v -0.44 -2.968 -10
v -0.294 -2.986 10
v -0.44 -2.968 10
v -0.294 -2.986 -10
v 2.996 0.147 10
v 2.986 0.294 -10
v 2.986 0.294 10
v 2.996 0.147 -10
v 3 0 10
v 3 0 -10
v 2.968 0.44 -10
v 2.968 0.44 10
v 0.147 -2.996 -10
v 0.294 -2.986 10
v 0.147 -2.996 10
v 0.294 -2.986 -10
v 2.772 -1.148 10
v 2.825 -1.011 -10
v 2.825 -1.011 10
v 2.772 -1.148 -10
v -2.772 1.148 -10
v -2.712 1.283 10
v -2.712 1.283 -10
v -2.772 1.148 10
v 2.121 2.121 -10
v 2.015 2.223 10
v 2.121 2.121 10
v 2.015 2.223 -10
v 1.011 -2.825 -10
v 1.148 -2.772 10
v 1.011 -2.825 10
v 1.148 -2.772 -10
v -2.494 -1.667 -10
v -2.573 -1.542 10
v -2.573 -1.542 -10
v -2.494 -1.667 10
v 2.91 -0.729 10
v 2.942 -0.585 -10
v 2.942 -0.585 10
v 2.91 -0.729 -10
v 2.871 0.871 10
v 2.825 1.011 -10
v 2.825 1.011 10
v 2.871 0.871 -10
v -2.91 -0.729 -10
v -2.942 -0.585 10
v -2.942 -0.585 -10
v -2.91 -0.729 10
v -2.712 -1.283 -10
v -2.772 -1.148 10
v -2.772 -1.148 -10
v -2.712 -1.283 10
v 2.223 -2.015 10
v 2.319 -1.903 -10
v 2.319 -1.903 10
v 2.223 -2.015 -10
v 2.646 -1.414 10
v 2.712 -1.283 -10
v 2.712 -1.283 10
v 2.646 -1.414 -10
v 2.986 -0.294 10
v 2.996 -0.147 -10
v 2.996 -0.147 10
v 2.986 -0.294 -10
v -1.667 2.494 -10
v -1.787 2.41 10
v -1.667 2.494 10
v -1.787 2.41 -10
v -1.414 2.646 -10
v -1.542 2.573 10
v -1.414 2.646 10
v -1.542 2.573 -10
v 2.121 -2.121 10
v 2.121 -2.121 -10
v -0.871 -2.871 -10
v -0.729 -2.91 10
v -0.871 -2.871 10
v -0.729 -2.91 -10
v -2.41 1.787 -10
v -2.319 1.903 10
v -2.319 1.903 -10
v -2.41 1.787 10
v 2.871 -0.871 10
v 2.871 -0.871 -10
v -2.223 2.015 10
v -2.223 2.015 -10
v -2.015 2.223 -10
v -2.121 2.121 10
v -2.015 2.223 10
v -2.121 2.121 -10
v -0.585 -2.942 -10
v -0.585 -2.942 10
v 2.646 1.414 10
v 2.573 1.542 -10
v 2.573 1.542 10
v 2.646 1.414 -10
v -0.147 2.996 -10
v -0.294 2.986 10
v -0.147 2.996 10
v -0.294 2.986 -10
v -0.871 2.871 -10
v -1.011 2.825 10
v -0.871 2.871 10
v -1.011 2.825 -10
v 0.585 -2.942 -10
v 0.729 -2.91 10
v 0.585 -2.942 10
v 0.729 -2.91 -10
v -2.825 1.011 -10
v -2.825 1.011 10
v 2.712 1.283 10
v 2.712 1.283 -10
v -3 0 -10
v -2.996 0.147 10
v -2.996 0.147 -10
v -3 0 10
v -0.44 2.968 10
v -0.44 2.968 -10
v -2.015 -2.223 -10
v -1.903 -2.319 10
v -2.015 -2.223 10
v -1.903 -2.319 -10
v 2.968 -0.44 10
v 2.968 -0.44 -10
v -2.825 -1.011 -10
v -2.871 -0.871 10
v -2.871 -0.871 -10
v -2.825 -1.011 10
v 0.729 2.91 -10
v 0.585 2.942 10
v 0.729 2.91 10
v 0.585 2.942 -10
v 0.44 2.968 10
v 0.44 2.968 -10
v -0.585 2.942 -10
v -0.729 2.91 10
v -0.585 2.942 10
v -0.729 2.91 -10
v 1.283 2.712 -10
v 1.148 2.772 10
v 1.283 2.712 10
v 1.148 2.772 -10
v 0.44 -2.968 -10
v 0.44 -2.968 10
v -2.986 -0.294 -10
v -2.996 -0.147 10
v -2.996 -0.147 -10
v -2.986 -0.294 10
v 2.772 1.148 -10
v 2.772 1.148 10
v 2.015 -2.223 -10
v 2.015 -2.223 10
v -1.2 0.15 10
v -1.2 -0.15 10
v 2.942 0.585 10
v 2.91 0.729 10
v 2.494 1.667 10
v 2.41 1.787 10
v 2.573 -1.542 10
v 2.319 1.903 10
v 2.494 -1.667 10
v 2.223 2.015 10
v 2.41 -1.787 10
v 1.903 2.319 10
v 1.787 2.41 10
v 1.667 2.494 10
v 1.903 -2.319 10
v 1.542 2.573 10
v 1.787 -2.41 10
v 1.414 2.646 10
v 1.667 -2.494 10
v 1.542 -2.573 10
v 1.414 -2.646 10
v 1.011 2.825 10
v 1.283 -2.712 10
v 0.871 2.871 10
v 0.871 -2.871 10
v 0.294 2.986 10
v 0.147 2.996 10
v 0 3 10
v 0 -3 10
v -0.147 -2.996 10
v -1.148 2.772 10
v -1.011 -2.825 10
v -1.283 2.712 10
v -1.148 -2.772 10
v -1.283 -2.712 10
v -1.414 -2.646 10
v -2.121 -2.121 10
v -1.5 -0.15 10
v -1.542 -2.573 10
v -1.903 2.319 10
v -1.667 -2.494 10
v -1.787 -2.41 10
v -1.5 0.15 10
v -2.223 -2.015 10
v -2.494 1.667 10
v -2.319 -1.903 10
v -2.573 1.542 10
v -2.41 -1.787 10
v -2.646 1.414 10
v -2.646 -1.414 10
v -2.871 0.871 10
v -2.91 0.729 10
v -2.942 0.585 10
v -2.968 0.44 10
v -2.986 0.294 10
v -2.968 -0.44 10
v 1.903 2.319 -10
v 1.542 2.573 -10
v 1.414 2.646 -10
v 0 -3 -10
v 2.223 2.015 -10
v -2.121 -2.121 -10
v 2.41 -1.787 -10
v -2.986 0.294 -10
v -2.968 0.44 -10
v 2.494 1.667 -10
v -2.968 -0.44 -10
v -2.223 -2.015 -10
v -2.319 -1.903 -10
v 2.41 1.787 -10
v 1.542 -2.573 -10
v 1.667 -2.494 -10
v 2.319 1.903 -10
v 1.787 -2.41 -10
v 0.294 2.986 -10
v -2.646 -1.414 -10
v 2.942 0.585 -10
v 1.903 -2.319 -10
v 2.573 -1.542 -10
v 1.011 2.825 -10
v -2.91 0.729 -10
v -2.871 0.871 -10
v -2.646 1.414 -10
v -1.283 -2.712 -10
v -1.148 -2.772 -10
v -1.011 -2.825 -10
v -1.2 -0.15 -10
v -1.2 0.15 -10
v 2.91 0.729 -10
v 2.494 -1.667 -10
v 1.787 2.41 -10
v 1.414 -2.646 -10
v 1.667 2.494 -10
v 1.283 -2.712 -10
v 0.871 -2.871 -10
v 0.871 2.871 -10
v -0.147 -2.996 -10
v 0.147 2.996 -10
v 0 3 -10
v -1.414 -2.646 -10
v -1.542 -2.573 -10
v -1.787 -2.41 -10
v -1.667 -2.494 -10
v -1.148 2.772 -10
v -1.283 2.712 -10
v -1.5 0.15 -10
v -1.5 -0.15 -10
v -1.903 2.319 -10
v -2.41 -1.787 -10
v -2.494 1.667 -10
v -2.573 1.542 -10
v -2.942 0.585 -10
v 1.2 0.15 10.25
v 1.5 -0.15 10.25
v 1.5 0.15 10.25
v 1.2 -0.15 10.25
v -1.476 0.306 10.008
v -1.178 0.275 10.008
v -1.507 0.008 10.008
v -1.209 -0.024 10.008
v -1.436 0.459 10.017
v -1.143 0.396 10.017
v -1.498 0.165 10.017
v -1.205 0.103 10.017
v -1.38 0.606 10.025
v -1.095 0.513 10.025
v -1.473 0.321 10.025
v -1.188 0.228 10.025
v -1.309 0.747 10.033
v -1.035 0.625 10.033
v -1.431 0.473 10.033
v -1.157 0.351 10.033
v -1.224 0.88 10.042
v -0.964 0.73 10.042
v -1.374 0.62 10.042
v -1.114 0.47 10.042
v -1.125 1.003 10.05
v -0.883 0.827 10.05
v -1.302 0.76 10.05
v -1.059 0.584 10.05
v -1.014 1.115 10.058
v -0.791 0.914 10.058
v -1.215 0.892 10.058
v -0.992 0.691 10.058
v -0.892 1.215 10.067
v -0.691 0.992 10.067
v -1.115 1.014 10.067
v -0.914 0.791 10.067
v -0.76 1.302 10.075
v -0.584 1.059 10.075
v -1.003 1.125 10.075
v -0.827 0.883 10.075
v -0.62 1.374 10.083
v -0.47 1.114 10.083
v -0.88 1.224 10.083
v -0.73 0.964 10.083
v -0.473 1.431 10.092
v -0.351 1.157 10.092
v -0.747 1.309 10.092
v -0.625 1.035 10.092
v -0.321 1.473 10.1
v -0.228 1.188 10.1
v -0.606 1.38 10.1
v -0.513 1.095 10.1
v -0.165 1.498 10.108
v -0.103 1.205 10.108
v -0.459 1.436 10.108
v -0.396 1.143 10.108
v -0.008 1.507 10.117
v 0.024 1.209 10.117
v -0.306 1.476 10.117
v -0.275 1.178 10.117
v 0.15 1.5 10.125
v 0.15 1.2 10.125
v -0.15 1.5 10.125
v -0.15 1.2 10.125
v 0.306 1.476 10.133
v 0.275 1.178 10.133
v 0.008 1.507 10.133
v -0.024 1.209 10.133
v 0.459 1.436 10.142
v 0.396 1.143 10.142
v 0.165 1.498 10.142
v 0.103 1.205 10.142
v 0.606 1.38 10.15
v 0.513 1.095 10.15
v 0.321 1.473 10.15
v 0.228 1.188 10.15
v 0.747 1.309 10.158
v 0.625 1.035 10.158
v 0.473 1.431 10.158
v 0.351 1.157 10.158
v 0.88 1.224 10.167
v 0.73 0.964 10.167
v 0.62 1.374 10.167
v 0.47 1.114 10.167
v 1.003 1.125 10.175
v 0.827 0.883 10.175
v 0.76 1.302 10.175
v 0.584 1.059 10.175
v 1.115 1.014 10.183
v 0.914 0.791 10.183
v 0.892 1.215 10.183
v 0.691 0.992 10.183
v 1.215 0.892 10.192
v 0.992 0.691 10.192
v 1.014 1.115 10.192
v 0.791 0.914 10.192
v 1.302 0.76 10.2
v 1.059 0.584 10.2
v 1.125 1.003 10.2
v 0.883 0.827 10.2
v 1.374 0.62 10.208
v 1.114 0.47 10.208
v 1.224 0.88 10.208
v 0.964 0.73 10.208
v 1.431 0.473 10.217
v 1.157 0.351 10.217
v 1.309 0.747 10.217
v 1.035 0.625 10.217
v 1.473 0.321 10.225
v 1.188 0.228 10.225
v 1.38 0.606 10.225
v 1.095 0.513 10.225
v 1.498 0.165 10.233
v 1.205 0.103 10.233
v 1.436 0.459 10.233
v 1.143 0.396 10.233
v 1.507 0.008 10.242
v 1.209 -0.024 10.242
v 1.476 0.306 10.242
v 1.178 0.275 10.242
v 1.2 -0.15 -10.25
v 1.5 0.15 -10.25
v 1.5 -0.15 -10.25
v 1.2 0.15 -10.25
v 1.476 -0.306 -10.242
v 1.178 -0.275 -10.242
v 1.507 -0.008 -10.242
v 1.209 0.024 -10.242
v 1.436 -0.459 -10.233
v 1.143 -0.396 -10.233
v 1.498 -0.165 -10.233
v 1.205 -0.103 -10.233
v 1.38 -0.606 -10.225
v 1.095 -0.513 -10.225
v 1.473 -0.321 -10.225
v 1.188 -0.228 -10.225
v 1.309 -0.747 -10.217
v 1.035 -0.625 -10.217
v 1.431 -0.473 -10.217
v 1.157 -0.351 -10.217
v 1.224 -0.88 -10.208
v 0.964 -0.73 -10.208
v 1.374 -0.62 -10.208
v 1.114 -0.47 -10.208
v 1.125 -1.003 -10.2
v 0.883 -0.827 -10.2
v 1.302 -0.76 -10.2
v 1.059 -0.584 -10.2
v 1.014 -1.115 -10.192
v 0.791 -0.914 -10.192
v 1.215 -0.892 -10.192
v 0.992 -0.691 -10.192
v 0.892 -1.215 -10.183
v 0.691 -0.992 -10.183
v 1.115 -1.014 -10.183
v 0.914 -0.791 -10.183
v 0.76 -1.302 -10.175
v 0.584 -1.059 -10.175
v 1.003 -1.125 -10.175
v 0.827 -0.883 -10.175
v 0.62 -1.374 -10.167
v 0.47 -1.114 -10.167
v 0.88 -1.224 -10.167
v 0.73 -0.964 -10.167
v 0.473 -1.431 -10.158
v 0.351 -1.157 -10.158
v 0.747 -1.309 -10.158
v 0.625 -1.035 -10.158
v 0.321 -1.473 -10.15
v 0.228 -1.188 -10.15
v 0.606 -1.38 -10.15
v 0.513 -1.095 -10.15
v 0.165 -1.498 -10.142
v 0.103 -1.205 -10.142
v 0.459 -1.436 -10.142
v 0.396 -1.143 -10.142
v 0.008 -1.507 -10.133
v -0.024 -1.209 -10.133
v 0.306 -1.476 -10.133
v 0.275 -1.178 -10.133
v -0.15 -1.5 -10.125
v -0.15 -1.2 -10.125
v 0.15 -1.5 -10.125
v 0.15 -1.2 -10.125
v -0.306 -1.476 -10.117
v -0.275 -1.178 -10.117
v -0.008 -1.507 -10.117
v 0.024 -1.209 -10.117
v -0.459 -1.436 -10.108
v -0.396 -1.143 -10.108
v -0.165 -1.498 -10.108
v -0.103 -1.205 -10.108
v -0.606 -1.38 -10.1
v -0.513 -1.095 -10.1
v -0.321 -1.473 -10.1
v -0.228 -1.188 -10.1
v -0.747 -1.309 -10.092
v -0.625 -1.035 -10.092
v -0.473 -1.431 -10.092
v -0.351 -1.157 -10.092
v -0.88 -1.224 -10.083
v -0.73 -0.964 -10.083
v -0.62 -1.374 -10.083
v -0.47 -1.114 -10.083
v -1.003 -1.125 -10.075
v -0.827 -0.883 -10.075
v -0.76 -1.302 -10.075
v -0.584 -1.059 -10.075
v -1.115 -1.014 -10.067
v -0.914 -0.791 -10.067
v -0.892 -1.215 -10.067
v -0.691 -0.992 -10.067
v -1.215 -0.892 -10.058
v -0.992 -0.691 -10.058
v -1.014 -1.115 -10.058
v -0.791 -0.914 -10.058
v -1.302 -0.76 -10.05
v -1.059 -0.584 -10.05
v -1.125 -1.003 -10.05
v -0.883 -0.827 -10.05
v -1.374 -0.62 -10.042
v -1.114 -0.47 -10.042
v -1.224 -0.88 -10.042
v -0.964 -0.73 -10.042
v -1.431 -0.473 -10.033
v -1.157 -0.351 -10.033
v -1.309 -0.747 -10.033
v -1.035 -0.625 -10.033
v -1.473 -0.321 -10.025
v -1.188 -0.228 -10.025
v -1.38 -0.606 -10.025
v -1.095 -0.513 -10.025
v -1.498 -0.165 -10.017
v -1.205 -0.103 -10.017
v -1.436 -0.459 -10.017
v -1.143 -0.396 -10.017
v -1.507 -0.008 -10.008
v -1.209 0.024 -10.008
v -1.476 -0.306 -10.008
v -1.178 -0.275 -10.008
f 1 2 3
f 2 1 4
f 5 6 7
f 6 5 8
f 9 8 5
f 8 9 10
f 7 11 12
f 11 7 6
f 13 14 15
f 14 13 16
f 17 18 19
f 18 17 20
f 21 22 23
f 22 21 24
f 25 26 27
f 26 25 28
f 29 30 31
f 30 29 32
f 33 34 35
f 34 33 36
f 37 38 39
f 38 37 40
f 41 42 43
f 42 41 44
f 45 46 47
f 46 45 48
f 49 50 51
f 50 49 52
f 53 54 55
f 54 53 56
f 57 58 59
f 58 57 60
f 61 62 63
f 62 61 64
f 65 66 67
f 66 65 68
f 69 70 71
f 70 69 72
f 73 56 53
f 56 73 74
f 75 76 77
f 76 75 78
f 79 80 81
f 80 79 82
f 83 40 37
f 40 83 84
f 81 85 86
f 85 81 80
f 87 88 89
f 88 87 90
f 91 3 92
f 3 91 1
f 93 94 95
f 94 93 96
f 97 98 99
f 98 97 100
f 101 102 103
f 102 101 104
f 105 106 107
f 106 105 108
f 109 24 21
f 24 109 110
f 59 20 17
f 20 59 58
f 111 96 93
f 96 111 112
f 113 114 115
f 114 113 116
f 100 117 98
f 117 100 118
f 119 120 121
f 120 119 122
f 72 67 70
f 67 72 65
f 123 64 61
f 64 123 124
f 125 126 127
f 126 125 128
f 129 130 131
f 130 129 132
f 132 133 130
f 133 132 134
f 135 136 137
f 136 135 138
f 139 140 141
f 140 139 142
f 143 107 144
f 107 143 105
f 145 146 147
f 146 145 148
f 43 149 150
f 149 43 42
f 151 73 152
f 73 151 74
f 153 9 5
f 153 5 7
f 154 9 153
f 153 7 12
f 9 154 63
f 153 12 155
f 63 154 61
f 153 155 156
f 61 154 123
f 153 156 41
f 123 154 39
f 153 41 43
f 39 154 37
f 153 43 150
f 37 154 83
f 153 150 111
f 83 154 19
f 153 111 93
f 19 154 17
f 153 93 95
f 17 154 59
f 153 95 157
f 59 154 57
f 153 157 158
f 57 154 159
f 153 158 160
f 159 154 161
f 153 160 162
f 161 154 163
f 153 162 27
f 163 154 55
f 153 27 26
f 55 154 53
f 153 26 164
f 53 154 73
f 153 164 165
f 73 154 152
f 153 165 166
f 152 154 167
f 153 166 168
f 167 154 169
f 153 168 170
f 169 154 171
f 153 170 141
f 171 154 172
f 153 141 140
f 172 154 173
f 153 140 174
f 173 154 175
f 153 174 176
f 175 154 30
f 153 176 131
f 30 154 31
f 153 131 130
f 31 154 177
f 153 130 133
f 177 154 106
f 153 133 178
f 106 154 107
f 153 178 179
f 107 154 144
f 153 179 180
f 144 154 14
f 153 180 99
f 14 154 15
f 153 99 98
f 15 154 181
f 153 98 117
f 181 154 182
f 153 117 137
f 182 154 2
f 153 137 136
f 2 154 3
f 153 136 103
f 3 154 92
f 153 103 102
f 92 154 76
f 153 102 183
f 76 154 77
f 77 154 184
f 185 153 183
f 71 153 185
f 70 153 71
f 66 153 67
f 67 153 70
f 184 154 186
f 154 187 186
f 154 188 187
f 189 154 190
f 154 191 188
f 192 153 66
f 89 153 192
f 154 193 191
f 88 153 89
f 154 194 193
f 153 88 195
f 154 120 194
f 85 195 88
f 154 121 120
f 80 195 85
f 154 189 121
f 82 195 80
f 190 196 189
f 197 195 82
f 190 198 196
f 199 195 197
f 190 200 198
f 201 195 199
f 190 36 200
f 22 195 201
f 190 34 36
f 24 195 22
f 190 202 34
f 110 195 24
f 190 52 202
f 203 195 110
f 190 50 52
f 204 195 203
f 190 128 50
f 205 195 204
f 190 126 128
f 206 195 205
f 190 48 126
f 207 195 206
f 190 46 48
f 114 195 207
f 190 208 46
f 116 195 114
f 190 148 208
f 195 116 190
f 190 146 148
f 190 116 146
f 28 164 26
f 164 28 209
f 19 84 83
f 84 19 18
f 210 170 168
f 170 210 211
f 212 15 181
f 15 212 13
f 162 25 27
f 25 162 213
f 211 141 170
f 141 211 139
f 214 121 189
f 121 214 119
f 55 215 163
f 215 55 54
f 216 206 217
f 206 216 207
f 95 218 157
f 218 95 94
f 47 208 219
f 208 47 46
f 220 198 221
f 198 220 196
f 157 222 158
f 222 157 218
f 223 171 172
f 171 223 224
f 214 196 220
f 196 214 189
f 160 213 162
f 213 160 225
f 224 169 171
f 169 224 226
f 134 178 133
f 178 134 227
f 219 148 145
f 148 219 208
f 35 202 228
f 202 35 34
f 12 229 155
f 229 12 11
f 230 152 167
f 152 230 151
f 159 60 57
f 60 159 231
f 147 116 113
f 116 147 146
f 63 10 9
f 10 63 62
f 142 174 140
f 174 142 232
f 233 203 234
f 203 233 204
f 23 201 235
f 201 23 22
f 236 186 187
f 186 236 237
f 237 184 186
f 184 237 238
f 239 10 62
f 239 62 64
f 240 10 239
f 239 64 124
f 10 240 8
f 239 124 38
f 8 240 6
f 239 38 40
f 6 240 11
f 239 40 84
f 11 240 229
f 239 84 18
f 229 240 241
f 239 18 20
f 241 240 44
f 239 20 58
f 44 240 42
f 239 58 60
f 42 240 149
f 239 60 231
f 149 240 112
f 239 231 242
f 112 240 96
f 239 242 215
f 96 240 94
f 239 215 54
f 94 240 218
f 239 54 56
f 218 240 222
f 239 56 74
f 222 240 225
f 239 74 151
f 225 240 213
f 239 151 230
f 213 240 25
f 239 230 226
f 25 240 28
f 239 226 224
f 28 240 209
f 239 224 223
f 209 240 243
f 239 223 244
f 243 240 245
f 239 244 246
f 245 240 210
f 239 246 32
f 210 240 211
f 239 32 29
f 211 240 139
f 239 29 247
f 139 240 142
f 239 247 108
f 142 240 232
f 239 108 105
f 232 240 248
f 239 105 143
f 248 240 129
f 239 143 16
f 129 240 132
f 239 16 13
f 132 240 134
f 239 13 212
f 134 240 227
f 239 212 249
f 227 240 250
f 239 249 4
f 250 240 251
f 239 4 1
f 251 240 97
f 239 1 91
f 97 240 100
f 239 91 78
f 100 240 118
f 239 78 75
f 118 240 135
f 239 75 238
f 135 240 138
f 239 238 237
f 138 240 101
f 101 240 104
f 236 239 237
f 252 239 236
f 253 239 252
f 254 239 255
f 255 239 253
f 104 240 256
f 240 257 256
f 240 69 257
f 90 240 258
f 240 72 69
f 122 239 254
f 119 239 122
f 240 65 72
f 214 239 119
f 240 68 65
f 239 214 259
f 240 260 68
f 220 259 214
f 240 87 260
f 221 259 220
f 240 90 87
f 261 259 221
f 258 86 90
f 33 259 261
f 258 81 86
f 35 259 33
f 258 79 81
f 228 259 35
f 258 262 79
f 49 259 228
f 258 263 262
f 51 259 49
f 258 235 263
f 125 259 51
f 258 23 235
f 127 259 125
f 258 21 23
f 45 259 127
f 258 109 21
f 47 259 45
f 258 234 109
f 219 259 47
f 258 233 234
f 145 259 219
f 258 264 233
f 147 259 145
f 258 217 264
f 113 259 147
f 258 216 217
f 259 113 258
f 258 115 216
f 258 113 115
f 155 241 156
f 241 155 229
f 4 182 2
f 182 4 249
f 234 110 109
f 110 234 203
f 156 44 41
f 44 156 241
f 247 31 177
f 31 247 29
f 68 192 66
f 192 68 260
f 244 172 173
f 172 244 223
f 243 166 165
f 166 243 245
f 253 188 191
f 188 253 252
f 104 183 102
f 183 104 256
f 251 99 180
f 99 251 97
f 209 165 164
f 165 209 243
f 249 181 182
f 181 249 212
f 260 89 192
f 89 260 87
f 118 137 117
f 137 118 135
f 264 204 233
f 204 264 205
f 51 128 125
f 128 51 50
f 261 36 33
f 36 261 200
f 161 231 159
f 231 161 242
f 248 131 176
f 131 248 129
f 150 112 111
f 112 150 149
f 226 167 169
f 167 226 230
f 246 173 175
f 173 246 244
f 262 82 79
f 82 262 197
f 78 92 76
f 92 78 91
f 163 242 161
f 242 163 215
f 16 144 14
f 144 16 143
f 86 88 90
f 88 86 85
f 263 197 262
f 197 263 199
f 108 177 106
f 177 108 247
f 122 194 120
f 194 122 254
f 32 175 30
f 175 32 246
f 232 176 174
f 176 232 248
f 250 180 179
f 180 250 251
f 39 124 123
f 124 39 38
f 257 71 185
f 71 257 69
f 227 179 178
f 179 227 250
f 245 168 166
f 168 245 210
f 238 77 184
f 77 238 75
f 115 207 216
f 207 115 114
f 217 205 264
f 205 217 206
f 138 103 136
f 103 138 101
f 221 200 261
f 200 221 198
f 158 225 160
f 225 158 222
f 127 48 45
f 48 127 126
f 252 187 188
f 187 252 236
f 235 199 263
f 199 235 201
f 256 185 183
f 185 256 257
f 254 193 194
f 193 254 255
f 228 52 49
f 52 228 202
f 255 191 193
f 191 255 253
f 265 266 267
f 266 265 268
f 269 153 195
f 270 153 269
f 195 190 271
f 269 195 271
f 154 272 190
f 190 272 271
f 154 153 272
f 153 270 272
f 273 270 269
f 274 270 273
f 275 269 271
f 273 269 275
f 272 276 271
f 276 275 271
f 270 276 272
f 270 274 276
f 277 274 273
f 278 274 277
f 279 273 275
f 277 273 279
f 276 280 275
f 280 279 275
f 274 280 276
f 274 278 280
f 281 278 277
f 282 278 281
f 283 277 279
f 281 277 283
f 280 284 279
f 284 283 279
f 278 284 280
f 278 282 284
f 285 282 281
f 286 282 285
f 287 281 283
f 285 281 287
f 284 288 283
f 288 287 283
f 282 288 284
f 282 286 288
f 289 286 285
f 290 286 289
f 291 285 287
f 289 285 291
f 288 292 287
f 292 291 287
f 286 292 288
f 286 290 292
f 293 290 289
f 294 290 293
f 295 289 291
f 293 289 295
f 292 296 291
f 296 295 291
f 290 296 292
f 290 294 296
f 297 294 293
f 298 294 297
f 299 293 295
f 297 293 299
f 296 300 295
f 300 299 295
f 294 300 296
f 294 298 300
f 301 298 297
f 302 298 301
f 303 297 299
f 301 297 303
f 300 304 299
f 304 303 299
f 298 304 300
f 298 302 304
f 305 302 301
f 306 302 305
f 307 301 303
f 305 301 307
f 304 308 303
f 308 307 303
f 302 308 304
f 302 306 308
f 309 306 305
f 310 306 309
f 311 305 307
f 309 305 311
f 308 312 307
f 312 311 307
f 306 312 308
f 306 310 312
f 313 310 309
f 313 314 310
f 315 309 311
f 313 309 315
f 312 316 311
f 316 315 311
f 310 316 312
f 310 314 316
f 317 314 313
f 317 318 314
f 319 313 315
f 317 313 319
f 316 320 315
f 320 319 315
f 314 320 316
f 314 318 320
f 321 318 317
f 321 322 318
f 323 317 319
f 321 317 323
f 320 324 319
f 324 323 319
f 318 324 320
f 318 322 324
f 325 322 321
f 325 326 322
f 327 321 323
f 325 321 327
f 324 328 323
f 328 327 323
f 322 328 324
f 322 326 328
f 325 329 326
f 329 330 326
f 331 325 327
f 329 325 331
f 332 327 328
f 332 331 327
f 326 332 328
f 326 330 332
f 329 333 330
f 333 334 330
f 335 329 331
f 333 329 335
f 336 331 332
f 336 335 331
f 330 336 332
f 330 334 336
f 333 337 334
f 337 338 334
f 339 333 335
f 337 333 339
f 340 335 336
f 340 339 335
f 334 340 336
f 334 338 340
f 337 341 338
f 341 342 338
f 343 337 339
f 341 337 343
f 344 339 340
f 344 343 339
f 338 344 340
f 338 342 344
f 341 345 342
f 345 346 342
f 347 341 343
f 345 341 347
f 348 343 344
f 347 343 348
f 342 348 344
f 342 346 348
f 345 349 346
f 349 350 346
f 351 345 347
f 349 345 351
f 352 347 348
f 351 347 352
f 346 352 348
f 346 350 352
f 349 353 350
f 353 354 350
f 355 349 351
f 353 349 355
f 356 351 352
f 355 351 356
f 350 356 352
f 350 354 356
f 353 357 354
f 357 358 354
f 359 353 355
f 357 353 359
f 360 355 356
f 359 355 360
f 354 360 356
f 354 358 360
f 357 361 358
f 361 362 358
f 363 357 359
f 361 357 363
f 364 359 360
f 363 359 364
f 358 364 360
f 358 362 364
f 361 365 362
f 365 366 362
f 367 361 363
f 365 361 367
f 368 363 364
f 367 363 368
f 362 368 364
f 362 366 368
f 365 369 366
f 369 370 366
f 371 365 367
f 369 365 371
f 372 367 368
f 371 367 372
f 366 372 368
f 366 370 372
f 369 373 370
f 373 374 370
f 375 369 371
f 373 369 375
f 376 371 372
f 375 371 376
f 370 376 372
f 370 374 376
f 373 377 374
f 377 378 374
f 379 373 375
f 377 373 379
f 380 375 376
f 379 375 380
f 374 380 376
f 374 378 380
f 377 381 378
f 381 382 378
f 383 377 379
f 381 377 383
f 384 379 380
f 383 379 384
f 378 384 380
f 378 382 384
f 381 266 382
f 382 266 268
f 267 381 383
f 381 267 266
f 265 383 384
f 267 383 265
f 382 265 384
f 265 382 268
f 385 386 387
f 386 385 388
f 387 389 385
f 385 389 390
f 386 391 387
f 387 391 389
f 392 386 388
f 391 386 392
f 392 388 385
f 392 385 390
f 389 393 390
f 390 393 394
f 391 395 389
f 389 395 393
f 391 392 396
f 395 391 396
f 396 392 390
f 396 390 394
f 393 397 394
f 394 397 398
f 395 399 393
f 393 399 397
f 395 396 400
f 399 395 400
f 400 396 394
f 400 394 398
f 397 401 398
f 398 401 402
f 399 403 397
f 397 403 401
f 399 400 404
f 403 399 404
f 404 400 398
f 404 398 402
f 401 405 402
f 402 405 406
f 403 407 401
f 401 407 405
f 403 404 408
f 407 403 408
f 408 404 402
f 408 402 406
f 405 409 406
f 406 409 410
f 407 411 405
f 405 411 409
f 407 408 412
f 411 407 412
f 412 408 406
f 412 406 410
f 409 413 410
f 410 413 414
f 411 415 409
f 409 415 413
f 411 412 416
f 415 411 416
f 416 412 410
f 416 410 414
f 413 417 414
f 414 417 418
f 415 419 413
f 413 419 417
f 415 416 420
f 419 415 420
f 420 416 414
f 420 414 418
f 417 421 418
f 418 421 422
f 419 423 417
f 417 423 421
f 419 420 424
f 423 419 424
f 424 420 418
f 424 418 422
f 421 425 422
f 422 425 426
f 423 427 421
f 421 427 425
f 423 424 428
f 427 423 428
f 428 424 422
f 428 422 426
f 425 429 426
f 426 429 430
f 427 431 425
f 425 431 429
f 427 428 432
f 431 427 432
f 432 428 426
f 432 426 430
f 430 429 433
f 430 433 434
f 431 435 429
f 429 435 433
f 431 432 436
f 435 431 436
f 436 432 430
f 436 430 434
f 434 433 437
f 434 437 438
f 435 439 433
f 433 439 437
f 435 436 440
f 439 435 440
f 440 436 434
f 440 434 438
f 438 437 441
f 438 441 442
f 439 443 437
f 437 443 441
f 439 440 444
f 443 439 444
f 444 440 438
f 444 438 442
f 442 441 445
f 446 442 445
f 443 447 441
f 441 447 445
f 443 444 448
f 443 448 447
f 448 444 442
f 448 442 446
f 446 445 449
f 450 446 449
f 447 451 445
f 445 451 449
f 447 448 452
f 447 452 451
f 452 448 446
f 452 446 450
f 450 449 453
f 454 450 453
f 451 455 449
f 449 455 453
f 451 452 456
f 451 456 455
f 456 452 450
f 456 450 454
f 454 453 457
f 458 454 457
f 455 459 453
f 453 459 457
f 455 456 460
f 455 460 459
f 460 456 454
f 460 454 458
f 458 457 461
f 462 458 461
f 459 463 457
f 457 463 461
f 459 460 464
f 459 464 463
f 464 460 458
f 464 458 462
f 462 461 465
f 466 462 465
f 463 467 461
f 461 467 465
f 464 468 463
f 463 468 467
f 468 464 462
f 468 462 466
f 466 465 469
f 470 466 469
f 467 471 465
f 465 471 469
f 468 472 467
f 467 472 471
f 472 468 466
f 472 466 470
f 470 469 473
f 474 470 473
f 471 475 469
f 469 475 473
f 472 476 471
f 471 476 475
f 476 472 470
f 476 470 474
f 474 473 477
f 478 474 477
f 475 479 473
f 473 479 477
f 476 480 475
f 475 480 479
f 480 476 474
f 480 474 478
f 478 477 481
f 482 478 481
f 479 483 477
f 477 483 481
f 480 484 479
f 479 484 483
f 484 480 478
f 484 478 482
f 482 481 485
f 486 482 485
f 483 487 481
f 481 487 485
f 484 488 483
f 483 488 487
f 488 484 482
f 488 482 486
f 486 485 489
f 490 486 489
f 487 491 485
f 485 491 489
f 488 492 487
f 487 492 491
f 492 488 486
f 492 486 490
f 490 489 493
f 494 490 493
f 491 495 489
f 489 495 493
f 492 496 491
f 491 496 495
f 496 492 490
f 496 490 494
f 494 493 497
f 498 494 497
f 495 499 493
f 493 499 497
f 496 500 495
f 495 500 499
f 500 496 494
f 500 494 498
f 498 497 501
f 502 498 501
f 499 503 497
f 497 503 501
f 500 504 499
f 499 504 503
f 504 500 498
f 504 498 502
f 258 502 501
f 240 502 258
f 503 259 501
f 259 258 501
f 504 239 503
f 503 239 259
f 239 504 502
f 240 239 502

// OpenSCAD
// Standoff pillar with external M3 threads on both ends
// Target: 3.0mm thread, 20.0mm long, diameter unspecified -> keep parametric

// Parameters
thread_diameter_mm = 3.0;          // M3 major diameter
length_mm = 20.0;                  // overall length
outer_diameter_mm = 6.0;           // pillar body diameter (parametric)
top_thread_length_mm = 6.0;
bottom_thread_length_mm = 6.0;

// Thread geometry (approx ISO metric external thread)
thread_pitch_mm = 0.5;             // M3 coarse pitch
thread_depth_mm = 0.30;            // radial height of thread (visual/printable approximation)

$fn = 128;

// Helical external thread (approx) using linear_extrude(twist)
// Built as a swept "tooth" that reaches the major diameter so it is visible.
module external_thread(d_major, pitch, len, depth) {
    turns = len / pitch;
    twist_deg = 360 * turns;

    // Place the tooth so its OUTER edge reaches d_major/2
    // (center of square at radius = d_major/2 - depth/2)
    linear_extrude(height=len, twist=twist_deg, slices=max(ceil(turns*60), 120), convexity=10)
        translate([d_major/2 - depth/2, 0, 0])
            square([depth, pitch*0.60], center=true);
}

module standoff() {
    eps = 0.25; // overlap to guarantee connectivity

    // Ensure the body is at least as large as the thread major diameter
    body_d = max(outer_diameter_mm, thread_diameter_mm);

    // Core under threads: slightly under major diameter so ridges protrude
    thread_core_d = thread_diameter_mm - 2*thread_depth_mm;

    union() {
        // Main pillar body (centered)
        cylinder(d=body_d, h=length_mm, center=true);

        // Core cylinders for threaded sections (connected with overlap)
        translate([0, 0, length_mm/2 - top_thread_length_mm/2 - eps/2])
            cylinder(d=thread_core_d, h=top_thread_length_mm + eps, center=true);

        translate([0, 0, -length_mm/2 + bottom_thread_length_mm/2 + eps/2])
            cylinder(d=thread_core_d, h=bottom_thread_length_mm + eps, center=true);

        // Helical thread ridges (top) - start exactly at top end of body
        translate([0, 0, length_mm/2 - top_thread_length_mm - eps])
            external_thread(thread_diameter_mm, thread_pitch_mm, top_thread_length_mm + 2*eps, thread_depth_mm);

        // Helical thread ridges (bottom) - end exactly at bottom end of body
        translate([0, 0, -length_mm/2 - eps])
            external_thread(thread_diameter_mm, thread_pitch_mm, bottom_thread_length_mm + 2*eps, thread_depth_mm);
    }
}

standoff();
